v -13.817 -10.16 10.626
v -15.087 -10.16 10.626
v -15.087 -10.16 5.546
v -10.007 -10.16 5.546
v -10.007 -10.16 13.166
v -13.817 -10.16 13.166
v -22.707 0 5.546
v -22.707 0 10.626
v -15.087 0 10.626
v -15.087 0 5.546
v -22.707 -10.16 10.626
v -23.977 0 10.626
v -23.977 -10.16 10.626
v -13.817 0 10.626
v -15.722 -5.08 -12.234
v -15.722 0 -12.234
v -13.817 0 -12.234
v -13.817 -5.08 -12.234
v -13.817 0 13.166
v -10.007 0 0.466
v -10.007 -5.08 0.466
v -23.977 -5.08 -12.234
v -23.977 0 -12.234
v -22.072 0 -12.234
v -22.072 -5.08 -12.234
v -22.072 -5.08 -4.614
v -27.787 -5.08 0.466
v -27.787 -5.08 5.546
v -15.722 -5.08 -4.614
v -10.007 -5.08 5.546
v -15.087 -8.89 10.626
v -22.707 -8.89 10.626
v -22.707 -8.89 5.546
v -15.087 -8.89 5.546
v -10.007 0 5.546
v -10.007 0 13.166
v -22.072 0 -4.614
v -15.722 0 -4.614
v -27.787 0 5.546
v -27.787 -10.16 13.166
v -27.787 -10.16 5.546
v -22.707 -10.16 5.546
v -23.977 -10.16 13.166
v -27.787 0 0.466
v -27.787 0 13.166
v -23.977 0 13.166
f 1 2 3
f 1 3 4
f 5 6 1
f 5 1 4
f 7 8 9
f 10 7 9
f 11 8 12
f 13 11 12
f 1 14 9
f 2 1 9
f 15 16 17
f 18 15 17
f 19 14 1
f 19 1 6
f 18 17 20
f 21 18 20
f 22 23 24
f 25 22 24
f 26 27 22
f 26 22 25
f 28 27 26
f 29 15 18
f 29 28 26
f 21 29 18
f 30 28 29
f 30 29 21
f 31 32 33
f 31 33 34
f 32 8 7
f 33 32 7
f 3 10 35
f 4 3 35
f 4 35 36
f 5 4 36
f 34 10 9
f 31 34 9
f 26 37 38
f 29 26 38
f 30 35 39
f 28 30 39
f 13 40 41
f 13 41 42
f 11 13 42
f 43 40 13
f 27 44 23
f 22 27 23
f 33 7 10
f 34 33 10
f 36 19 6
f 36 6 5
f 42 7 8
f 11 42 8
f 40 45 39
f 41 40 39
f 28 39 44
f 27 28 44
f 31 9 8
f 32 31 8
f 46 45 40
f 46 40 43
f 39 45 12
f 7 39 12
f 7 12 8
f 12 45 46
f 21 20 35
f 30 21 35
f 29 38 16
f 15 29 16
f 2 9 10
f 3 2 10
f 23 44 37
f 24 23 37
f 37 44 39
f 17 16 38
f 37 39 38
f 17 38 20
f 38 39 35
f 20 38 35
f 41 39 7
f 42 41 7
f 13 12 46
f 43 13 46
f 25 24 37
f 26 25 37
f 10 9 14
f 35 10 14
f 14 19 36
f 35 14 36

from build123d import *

# Parameters (mm, degrees)
F0_W     = 3.81
F0_H     = 2.54
F1_DEPTH = 10.16
F2_DEPTH = 8.89
F3_DEPTH = 5.08


with BuildPart() as f1:
    # F0 (on Front) → F1 (new body)
    with BuildSketch(Plane.XZ):
        with Locations((-25.8821314108, 11.8955207688)):
            Rectangle(F0_W, F0_H)
        Polygon((-27.7871314108, 5.5455207688), (-22.7071314108, 5.5455207688), (-22.7071314108, 10.6255207688), (-23.9771314108, 10.6255207688), (-27.7871314108, 10.6255207688), align=None)
    extrude(amount=F1_DEPTH)


with BuildPart() as f1b:
    # F0 (on Front) → F1, piece 2 (new body)
    with BuildSketch(Plane.XZ):
        with Locations((-11.9121314108, 11.8955207688)):
            Rectangle(F0_W, F0_H)
        Polygon((-10.0071314108, 5.5455207688), (-10.0071314108, 10.6255207688), (-13.8171314108, 10.6255207688), (-15.0871314108, 10.6255207688), (-15.0871314108, 5.5455207688), align=None)
    extrude(amount=F1_DEPTH)


with BuildPart() as f2:
    # F0 (on Front) → F2 (new body)
    with BuildSketch(Plane.XZ):
        Polygon((-18.8971314108, 5.5455207688), (-15.0871314108, 5.5455207688), (-15.0871314108, 10.6255207688), (-18.8971314108, 10.6255207688), (-22.7071314108, 10.6255207688), (-22.7071314108, 5.5455207688), align=None)
    extrude(amount=F2_DEPTH)


with BuildPart() as f3:
    # F0 (on Front) → F3 (new body)
    with BuildSketch(Plane.XZ):
        Polygon((-10.0071314108, 0.4655207688), (-10.0071314108, 5.5455207688), (-15.0871314108, 5.5455207688), (-18.8971314108, 5.5455207688), (-22.7071314108, 5.5455207688), (-27.7871314108, 5.5455207688), (-27.7871314108, 0.4655207688), (-23.9771314108, -12.2344792312), (-22.0721314108, -12.2344792312), (-22.0721314108, -4.6144792312), (-18.8971314108, -4.6144792312), (-15.7221314108, -4.6144792312), (-15.7221314108, -12.2344792312), (-13.8171314108, -12.2344792312), align=None)
    extrude(amount=F3_DEPTH)


solid = Compound([f1.part, f1b.part, f2.part, f3.part])
